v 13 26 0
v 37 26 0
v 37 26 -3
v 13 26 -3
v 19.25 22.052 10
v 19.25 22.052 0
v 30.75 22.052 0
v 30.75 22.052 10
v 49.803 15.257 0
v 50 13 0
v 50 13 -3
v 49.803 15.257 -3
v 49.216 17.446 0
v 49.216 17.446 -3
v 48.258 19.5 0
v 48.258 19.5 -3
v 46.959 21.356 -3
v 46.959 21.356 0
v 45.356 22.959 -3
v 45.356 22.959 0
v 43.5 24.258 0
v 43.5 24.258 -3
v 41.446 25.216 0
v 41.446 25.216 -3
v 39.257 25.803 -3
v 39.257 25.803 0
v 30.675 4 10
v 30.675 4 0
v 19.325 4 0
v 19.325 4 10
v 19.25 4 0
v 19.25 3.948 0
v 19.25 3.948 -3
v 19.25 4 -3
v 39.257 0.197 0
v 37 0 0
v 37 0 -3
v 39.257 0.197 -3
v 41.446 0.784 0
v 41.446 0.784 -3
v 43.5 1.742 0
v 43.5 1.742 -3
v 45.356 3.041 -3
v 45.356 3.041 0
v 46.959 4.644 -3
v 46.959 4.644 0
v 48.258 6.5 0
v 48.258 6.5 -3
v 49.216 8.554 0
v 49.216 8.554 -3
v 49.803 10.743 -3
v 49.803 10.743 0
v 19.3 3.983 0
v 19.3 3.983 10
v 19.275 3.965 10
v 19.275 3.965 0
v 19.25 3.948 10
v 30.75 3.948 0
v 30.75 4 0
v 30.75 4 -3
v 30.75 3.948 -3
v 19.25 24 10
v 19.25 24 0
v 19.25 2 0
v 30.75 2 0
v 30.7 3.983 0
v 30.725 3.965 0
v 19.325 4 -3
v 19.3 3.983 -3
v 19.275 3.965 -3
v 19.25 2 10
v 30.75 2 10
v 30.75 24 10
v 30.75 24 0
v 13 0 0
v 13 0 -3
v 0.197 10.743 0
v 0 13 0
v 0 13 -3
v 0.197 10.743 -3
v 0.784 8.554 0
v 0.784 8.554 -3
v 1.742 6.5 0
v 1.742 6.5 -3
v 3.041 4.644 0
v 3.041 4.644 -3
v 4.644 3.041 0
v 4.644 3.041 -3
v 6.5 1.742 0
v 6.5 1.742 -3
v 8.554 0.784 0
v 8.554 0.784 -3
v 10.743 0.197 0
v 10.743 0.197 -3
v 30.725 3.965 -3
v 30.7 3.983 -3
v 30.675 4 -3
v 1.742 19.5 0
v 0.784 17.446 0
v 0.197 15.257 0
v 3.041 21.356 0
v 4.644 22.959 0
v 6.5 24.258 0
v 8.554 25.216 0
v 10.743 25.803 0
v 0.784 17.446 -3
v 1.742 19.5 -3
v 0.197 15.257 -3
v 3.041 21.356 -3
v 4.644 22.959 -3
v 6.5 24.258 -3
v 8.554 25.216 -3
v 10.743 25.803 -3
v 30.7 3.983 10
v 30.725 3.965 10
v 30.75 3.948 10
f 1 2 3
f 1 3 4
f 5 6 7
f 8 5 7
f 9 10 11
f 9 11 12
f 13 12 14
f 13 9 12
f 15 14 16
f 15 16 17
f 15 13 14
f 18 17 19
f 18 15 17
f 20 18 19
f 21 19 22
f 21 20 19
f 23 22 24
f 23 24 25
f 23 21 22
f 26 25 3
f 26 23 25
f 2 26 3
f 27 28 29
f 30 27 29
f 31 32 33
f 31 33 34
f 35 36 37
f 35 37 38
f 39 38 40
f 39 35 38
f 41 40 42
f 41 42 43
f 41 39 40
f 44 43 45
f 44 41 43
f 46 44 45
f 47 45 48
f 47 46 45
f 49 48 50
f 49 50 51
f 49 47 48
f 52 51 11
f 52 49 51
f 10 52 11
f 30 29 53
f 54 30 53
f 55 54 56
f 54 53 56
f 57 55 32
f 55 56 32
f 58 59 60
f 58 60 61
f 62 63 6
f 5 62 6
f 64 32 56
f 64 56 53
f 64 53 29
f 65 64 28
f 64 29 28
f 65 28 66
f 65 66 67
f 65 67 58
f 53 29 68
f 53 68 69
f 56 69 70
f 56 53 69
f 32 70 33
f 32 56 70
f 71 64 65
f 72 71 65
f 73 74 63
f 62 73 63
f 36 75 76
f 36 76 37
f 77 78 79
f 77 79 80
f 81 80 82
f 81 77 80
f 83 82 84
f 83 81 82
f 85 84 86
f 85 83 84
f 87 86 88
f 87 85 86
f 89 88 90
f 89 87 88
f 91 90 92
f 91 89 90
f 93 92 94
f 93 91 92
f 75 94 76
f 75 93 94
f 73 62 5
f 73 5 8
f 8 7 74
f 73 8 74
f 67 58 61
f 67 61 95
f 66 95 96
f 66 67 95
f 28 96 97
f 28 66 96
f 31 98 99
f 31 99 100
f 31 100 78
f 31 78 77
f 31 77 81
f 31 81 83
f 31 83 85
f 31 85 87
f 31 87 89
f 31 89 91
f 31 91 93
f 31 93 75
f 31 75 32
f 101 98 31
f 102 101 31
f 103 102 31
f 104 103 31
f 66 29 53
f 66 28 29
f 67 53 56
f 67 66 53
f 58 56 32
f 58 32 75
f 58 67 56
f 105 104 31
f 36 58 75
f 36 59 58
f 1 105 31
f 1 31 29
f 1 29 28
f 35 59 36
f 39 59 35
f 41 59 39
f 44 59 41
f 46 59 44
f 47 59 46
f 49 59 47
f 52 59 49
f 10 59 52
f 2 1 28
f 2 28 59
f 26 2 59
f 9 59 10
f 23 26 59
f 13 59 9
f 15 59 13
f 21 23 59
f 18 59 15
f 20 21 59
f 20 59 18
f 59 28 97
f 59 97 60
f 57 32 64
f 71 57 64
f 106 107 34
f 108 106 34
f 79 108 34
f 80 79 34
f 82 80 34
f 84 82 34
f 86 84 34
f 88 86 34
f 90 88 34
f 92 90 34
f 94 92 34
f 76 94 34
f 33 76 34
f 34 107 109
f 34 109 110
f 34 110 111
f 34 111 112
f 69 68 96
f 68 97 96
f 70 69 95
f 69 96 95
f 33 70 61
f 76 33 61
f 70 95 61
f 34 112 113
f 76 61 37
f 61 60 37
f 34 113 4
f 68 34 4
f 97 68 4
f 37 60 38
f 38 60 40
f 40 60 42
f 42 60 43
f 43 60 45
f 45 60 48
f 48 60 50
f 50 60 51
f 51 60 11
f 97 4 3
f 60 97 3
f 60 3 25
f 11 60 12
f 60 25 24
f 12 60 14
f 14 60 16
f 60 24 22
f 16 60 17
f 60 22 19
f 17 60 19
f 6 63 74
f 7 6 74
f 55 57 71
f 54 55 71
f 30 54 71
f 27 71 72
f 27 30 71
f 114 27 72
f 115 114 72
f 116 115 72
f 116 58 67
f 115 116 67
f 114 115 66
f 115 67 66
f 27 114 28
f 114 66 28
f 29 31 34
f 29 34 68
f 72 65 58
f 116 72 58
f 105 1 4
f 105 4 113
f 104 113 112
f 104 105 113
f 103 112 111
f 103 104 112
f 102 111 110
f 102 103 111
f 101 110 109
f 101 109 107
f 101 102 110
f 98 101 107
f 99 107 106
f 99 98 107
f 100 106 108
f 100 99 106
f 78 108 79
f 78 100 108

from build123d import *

# Parameters (mm, degrees)
F1_DEPTH = 10
F2_DEPTH = 3


with BuildPart() as f1:
    # F0 (on Top) → F1 (new body)
    with BuildSketch(Plane.XY):
        with BuildLine():
            Line((30.0717967697, 24), (19.9282032303, 24))
            ThreePointArc((19.9282032303, 24), (21.18761006, 23.0976750545), (22.3307288033, 22.0519334951))
            Line((22.3307288033, 22.0519334951), (27.6692711967, 22.0519334951))
            ThreePointArc((27.6692711967, 22.0519334951), (28.81238994, 23.0976750545), (30.0717967697, 24))
        make_face()
        with BuildLine():
            ThreePointArc((22.3307288033, 22.0519334951), (21.18761006, 23.0976750545), (19.9282032303, 24))
            Line((19.9282032303, 24), (19.25, 24))
            Line((19.25, 24), (19.25, 22.0519334951))
            Line((19.25, 22.0519334951), (22.3307288033, 22.0519334951))
        make_face()
        with BuildLine():
            Line((30.75, 24), (30.0717967697, 24))
            ThreePointArc((30.0717967697, 24), (28.81238994, 23.0976750545), (27.6692711967, 22.0519334951))
            Line((27.6692711967, 22.0519334951), (30.75, 22.0519334951))
            Line((30.75, 22.0519334951), (30.75, 24))
        make_face()
    extrude(amount=F1_DEPTH)


with BuildPart() as f1b:
    # F0 (on Top) → F1, piece 2 (new body)
    with BuildSketch(Plane.XY):
        with BuildLine():
            ThreePointArc((22.3808315196, 4), (21.2156042759, 2.9250882693), (19.9282032303, 2))
            Line((19.9282032303, 2), (30.0717967697, 2))
            ThreePointArc((30.0717967697, 2), (28.7843957241, 2.9250882693), (27.6191684804, 4))
            Line((27.6191684804, 4), (22.3808315196, 4))
        make_face()
        with BuildLine():
            Line((19.25, 2), (19.9282032303, 2))
            ThreePointArc((19.9282032303, 2), (21.2156042759, 2.9250882693), (22.3808315196, 4))
            Line((22.3808315196, 4), (19.3245553203, 4))
            ThreePointArc((19.3245553203, 4), (19.2873312819, 3.9739562735), (19.25, 3.9480665049))
            Line((19.25, 3.9480665049), (19.25, 2))
        make_face()
        with BuildLine():
            ThreePointArc((27.6191684804, 4), (28.7843957241, 2.9250882693), (30.0717967697, 2))
            Line((30.0717967697, 2), (30.75, 2))
            Line((30.75, 2), (30.75, 3.9480665049))
            ThreePointArc((30.75, 3.9480665049), (30.7126687181, 3.9739562735), (30.6754446797, 4))
            Line((30.6754446797, 4), (27.6191684804, 4))
        make_face()
    extrude(amount=F1_DEPTH)


with BuildPart() as f2:
    # F0 (on Top) → F2 (new body)
    with BuildSketch(Plane.XY):
        with BuildLine():
            ThreePointArc((37, 0), (46.1923881554, 3.8076118446), (50, 13))
            Line((50, 13), (48, 13))
            ThreePointArc((48, 13), (44.7781745931, 5.2218254069), (37, 2))
            Line((37, 2), (37, 0))
        make_face()
        with BuildLine():
            ThreePointArc((50, 13), (46.1923881554, 22.1923881554), (37, 26))
            ThreePointArc((37, 26), (33.3944487245, 25.4899959968), (30.0717967697, 24))
            Line((30.0717967697, 24), (30.75, 24))
            Line((30.75, 24), (37, 24))
            ThreePointArc((37, 24), (44.7781745931, 20.7781745931), (48, 13))
            Line((48, 13), (50, 13))
        make_face()
        with BuildLine():
            Line((37, 13), (48, 13))
            ThreePointArc((48, 13), (44.7781745931, 20.7781745931), (37, 24))
            ThreePointArc((37, 24), (33.7267194167, 23.5016967307), (30.75, 22.0519334951))
            ThreePointArc((30.75, 22.0519334951), (27.2596201306, 18.1112620751), (26, 13))
            ThreePointArc((26, 13), (27.238593633, 7.9290093928), (30.6754446797, 4))
            Line((30.6754446797, 4), (30.75, 4))
            Line((30.75, 4), (30.75, 3.9480665049))
            ThreePointArc((30.75, 3.9480665049), (33.7267194167, 2.4983032693), (37, 2))
            Line((37, 2), (37, 13))
        make_face()
        with BuildLine():
            Line((37, 24), (30.75, 24))
            Line((30.75, 24), (30.75, 22.0519334951))
            ThreePointArc((30.75, 22.0519334951), (33.7267194167, 23.5016967307), (37, 24))
        make_face()
        with BuildLine():
            Line((30.75, 24), (30.0717967697, 24))
            ThreePointArc((30.0717967697, 24), (28.81238994, 23.0976750545), (27.6692711967, 22.0519334951))
            Line((27.6692711967, 22.0519334951), (30.75, 22.0519334951))
            Line((30.75, 22.0519334951), (30.75, 24))
        make_face()
        with BuildLine():
            ThreePointArc((26, 13), (25.747548784, 15.5495097568), (25, 18))
            ThreePointArc((25, 18), (24.252451216, 15.5495097568), (24, 13))
            ThreePointArc((24, 13), (24.252451216, 10.4504902432), (25, 8))
            ThreePointArc((25, 8), (25.747548784, 10.4504902432), (26, 13))
        make_face()
        with BuildLine():
            ThreePointArc((30.6754446797, 4), (27.238593633, 7.9290093928), (26, 13))
            ThreePointArc((26, 13), (25.747548784, 10.4504902432), (25, 8))
            ThreePointArc((25, 8), (26.1241097322, 5.8785527537), (27.6191684804, 4))
            Line((27.6191684804, 4), (30.6754446797, 4))
        make_face()
        with BuildLine():
            ThreePointArc((27.6191684804, 4), (28.7843957241, 2.9250882693), (30.0717967697, 2))
            Line((30.0717967697, 2), (30.75, 2))
            Line((30.75, 2), (30.75, 3.9480665049))
            ThreePointArc((30.75, 3.9480665049), (30.7126687181, 3.9739562735), (30.6754446797, 4))
            Line((30.6754446797, 4), (27.6191684804, 4))
        make_face()
        with BuildLine():
            Line((30.75, 2), (37, 2))
            ThreePointArc((37, 2), (33.7267194167, 2.4983032693), (30.75, 3.9480665049))
            Line((30.75, 3.9480665049), (30.75, 2))
        make_face()
        with BuildLine():
            ThreePointArc((30.0717967697, 2), (33.3944487245, 0.5100040032), (37, 0))
            Line((37, 0), (37, 2))
            Line((37, 2), (30.75, 2))
            Line((30.75, 2), (30.0717967697, 2))
        make_face()
        with BuildLine():
            Line((30.75, 22.0519334951), (27.6692711967, 22.0519334951))
            ThreePointArc((27.6692711967, 22.0519334951), (26.1439169549, 20.1516054784), (25, 18))
            ThreePointArc((25, 18), (25.747548784, 15.5495097568), (26, 13))
            ThreePointArc((26, 13), (27.2596201306, 18.1112620751), (30.75, 22.0519334951))
        make_face()
        with BuildLine():
            Line((27.6692711967, 22.0519334951), (22.3307288033, 22.0519334951))
            ThreePointArc((22.3307288033, 22.0519334951), (23.8560830451, 20.1516054784), (25, 18))
            ThreePointArc((25, 18), (26.1439169549, 20.1516054784), (27.6692711967, 22.0519334951))
        make_face()
        with BuildLine():
            Line((30.0717967697, 24), (19.9282032303, 24))
            ThreePointArc((19.9282032303, 24), (21.18761006, 23.0976750545), (22.3307288033, 22.0519334951))
            Line((22.3307288033, 22.0519334951), (27.6692711967, 22.0519334951))
            ThreePointArc((27.6692711967, 22.0519334951), (28.81238994, 23.0976750545), (30.0717967697, 24))
        make_face()
        with BuildLine():
            ThreePointArc((22.3307288033, 22.0519334951), (21.18761006, 23.0976750545), (19.9282032303, 24))
            Line((19.9282032303, 24), (19.25, 24))
            Line((19.25, 24), (19.25, 22.0519334951))
            Line((19.25, 22.0519334951), (22.3307288033, 22.0519334951))
        make_face()
        with BuildLine():
            ThreePointArc((25, 18), (23.8560830451, 20.1516054784), (22.3307288033, 22.0519334951))
            Line((22.3307288033, 22.0519334951), (19.25, 22.0519334951))
            ThreePointArc((19.25, 22.0519334951), (22.7403798694, 18.1112620751), (24, 13))
            ThreePointArc((24, 13), (24.252451216, 15.5495097568), (25, 18))
        make_face()
        with BuildLine():
            ThreePointArc((13, 24), (5.2218254069, 20.7781745931), (2, 13))
            Line((2, 13), (13, 13))
            Line((13, 13), (13, 2))
            ThreePointArc((13, 2), (16.2732805833, 2.4983032693), (19.25, 3.9480665049))
            Line((19.25, 3.9480665049), (19.25, 4))
            Line((19.25, 4), (19.3245553203, 4))
            ThreePointArc((19.3245553203, 4), (22.761406367, 7.9290093928), (24, 13))
            ThreePointArc((24, 13), (22.7403798694, 18.1112620751), (19.25, 22.0519334951))
            ThreePointArc((19.25, 22.0519334951), (16.2732805833, 23.5016967307), (13, 24))
        make_face()
        with BuildLine():
            Line((19.3245553203, 4), (22.3808315196, 4))
            ThreePointArc((22.3808315196, 4), (23.8758902678, 5.8785527537), (25, 8))
            ThreePointArc((25, 8), (24.252451216, 10.4504902432), (24, 13))
            ThreePointArc((24, 13), (22.761406367, 7.9290093928), (19.3245553203, 4))
        make_face()
        with BuildLine():
            ThreePointArc((19.25, 3.9480665049), (16.2732805833, 2.4983032693), (13, 2))
            Line((13, 2), (19.25, 2))
            Line((19.25, 2), (19.25, 3.9480665049))
        make_face()
        with BuildLine():
            Line((19.25, 2), (19.9282032303, 2))
            ThreePointArc((19.9282032303, 2), (21.2156042759, 2.9250882693), (22.3808315196, 4))
            Line((22.3808315196, 4), (19.3245553203, 4))
            ThreePointArc((19.3245553203, 4), (19.2873312819, 3.9739562735), (19.25, 3.9480665049))
            Line((19.25, 3.9480665049), (19.25, 2))
        make_face()
        with BuildLine():
            ThreePointArc((22.3808315196, 4), (21.2156042759, 2.9250882693), (19.9282032303, 2))
            Line((19.9282032303, 2), (30.0717967697, 2))
            ThreePointArc((30.0717967697, 2), (28.7843957241, 2.9250882693), (27.6191684804, 4))
            Line((27.6191684804, 4), (22.3808315196, 4))
        make_face()
        with BuildLine():
            ThreePointArc((25, 8), (23.8758902678, 5.8785527537), (22.3808315196, 4))
            Line((22.3808315196, 4), (27.6191684804, 4))
            ThreePointArc((27.6191684804, 4), (26.1241097322, 5.8785527537), (25, 8))
        make_face()
        with BuildLine():
            Line((19.25, 22.0519334951), (19.25, 24))
            Line((19.25, 24), (13, 24))
            ThreePointArc((13, 24), (16.2732805833, 23.5016967307), (19.25, 22.0519334951))
        make_face()
        with BuildLine():
            ThreePointArc((19.9282032303, 24), (16.6055512755, 25.4899959968), (13, 26))
            ThreePointArc((13, 26), (3.8076118446, 22.1923881554), (0, 13))
            Line((0, 13), (2, 13))
            ThreePointArc((2, 13), (5.2218254069, 20.7781745931), (13, 24))
            Line((13, 24), (19.25, 24))
            Line((19.25, 24), (19.9282032303, 24))
        make_face()
        with BuildLine():
            Line((13, 13), (2, 13))
            ThreePointArc((2, 13), (5.2218254069, 5.2218254069), (13, 2))
            Line((13, 2), (13, 13))
        make_face()
        with BuildLine():
            Line((2, 13), (0, 13))
            ThreePointArc((0, 13), (3.8076118446, 3.8076118446), (13, 0))
            Line((13, 0), (13, 2))
            ThreePointArc((13, 2), (5.2218254069, 5.2218254069), (2, 13))
        make_face()
        with BuildLine():
            Line((13, 2), (13, 0))
            ThreePointArc((13, 0), (16.6055512755, 0.5100040032), (19.9282032303, 2))
            Line((19.9282032303, 2), (19.25, 2))
            Line((19.25, 2), (13, 2))
        make_face()
        with BuildLine():
            ThreePointArc((19.9282032303, 2), (16.6055512755, 0.5100040032), (13, 0))
            Line((13, 0), (19.25, 0))
            Line((19.25, 0), (30.75, 0))
            Line((30.75, 0), (37, 0))
            ThreePointArc((37, 0), (33.3944487245, 0.5100040032), (30.0717967697, 2))
            Line((30.0717967697, 2), (19.9282032303, 2))
        make_face()
        with BuildLine():
            Line((37, 26), (13, 26))
            ThreePointArc((13, 26), (16.6055512755, 25.4899959968), (19.9282032303, 24))
            Line((19.9282032303, 24), (30.0717967697, 24))
            ThreePointArc((30.0717967697, 24), (33.3944487245, 25.4899959968), (37, 26))
        make_face()
        with BuildLine():
            ThreePointArc((37, 2), (44.7781745931, 5.2218254069), (48, 13))
            Line((48, 13), (37, 13))
            Line((37, 13), (37, 2))
        make_face()
    extrude(amount=-F2_DEPTH)


solid = Compound([f1.part, f1b.part, f2.part])
